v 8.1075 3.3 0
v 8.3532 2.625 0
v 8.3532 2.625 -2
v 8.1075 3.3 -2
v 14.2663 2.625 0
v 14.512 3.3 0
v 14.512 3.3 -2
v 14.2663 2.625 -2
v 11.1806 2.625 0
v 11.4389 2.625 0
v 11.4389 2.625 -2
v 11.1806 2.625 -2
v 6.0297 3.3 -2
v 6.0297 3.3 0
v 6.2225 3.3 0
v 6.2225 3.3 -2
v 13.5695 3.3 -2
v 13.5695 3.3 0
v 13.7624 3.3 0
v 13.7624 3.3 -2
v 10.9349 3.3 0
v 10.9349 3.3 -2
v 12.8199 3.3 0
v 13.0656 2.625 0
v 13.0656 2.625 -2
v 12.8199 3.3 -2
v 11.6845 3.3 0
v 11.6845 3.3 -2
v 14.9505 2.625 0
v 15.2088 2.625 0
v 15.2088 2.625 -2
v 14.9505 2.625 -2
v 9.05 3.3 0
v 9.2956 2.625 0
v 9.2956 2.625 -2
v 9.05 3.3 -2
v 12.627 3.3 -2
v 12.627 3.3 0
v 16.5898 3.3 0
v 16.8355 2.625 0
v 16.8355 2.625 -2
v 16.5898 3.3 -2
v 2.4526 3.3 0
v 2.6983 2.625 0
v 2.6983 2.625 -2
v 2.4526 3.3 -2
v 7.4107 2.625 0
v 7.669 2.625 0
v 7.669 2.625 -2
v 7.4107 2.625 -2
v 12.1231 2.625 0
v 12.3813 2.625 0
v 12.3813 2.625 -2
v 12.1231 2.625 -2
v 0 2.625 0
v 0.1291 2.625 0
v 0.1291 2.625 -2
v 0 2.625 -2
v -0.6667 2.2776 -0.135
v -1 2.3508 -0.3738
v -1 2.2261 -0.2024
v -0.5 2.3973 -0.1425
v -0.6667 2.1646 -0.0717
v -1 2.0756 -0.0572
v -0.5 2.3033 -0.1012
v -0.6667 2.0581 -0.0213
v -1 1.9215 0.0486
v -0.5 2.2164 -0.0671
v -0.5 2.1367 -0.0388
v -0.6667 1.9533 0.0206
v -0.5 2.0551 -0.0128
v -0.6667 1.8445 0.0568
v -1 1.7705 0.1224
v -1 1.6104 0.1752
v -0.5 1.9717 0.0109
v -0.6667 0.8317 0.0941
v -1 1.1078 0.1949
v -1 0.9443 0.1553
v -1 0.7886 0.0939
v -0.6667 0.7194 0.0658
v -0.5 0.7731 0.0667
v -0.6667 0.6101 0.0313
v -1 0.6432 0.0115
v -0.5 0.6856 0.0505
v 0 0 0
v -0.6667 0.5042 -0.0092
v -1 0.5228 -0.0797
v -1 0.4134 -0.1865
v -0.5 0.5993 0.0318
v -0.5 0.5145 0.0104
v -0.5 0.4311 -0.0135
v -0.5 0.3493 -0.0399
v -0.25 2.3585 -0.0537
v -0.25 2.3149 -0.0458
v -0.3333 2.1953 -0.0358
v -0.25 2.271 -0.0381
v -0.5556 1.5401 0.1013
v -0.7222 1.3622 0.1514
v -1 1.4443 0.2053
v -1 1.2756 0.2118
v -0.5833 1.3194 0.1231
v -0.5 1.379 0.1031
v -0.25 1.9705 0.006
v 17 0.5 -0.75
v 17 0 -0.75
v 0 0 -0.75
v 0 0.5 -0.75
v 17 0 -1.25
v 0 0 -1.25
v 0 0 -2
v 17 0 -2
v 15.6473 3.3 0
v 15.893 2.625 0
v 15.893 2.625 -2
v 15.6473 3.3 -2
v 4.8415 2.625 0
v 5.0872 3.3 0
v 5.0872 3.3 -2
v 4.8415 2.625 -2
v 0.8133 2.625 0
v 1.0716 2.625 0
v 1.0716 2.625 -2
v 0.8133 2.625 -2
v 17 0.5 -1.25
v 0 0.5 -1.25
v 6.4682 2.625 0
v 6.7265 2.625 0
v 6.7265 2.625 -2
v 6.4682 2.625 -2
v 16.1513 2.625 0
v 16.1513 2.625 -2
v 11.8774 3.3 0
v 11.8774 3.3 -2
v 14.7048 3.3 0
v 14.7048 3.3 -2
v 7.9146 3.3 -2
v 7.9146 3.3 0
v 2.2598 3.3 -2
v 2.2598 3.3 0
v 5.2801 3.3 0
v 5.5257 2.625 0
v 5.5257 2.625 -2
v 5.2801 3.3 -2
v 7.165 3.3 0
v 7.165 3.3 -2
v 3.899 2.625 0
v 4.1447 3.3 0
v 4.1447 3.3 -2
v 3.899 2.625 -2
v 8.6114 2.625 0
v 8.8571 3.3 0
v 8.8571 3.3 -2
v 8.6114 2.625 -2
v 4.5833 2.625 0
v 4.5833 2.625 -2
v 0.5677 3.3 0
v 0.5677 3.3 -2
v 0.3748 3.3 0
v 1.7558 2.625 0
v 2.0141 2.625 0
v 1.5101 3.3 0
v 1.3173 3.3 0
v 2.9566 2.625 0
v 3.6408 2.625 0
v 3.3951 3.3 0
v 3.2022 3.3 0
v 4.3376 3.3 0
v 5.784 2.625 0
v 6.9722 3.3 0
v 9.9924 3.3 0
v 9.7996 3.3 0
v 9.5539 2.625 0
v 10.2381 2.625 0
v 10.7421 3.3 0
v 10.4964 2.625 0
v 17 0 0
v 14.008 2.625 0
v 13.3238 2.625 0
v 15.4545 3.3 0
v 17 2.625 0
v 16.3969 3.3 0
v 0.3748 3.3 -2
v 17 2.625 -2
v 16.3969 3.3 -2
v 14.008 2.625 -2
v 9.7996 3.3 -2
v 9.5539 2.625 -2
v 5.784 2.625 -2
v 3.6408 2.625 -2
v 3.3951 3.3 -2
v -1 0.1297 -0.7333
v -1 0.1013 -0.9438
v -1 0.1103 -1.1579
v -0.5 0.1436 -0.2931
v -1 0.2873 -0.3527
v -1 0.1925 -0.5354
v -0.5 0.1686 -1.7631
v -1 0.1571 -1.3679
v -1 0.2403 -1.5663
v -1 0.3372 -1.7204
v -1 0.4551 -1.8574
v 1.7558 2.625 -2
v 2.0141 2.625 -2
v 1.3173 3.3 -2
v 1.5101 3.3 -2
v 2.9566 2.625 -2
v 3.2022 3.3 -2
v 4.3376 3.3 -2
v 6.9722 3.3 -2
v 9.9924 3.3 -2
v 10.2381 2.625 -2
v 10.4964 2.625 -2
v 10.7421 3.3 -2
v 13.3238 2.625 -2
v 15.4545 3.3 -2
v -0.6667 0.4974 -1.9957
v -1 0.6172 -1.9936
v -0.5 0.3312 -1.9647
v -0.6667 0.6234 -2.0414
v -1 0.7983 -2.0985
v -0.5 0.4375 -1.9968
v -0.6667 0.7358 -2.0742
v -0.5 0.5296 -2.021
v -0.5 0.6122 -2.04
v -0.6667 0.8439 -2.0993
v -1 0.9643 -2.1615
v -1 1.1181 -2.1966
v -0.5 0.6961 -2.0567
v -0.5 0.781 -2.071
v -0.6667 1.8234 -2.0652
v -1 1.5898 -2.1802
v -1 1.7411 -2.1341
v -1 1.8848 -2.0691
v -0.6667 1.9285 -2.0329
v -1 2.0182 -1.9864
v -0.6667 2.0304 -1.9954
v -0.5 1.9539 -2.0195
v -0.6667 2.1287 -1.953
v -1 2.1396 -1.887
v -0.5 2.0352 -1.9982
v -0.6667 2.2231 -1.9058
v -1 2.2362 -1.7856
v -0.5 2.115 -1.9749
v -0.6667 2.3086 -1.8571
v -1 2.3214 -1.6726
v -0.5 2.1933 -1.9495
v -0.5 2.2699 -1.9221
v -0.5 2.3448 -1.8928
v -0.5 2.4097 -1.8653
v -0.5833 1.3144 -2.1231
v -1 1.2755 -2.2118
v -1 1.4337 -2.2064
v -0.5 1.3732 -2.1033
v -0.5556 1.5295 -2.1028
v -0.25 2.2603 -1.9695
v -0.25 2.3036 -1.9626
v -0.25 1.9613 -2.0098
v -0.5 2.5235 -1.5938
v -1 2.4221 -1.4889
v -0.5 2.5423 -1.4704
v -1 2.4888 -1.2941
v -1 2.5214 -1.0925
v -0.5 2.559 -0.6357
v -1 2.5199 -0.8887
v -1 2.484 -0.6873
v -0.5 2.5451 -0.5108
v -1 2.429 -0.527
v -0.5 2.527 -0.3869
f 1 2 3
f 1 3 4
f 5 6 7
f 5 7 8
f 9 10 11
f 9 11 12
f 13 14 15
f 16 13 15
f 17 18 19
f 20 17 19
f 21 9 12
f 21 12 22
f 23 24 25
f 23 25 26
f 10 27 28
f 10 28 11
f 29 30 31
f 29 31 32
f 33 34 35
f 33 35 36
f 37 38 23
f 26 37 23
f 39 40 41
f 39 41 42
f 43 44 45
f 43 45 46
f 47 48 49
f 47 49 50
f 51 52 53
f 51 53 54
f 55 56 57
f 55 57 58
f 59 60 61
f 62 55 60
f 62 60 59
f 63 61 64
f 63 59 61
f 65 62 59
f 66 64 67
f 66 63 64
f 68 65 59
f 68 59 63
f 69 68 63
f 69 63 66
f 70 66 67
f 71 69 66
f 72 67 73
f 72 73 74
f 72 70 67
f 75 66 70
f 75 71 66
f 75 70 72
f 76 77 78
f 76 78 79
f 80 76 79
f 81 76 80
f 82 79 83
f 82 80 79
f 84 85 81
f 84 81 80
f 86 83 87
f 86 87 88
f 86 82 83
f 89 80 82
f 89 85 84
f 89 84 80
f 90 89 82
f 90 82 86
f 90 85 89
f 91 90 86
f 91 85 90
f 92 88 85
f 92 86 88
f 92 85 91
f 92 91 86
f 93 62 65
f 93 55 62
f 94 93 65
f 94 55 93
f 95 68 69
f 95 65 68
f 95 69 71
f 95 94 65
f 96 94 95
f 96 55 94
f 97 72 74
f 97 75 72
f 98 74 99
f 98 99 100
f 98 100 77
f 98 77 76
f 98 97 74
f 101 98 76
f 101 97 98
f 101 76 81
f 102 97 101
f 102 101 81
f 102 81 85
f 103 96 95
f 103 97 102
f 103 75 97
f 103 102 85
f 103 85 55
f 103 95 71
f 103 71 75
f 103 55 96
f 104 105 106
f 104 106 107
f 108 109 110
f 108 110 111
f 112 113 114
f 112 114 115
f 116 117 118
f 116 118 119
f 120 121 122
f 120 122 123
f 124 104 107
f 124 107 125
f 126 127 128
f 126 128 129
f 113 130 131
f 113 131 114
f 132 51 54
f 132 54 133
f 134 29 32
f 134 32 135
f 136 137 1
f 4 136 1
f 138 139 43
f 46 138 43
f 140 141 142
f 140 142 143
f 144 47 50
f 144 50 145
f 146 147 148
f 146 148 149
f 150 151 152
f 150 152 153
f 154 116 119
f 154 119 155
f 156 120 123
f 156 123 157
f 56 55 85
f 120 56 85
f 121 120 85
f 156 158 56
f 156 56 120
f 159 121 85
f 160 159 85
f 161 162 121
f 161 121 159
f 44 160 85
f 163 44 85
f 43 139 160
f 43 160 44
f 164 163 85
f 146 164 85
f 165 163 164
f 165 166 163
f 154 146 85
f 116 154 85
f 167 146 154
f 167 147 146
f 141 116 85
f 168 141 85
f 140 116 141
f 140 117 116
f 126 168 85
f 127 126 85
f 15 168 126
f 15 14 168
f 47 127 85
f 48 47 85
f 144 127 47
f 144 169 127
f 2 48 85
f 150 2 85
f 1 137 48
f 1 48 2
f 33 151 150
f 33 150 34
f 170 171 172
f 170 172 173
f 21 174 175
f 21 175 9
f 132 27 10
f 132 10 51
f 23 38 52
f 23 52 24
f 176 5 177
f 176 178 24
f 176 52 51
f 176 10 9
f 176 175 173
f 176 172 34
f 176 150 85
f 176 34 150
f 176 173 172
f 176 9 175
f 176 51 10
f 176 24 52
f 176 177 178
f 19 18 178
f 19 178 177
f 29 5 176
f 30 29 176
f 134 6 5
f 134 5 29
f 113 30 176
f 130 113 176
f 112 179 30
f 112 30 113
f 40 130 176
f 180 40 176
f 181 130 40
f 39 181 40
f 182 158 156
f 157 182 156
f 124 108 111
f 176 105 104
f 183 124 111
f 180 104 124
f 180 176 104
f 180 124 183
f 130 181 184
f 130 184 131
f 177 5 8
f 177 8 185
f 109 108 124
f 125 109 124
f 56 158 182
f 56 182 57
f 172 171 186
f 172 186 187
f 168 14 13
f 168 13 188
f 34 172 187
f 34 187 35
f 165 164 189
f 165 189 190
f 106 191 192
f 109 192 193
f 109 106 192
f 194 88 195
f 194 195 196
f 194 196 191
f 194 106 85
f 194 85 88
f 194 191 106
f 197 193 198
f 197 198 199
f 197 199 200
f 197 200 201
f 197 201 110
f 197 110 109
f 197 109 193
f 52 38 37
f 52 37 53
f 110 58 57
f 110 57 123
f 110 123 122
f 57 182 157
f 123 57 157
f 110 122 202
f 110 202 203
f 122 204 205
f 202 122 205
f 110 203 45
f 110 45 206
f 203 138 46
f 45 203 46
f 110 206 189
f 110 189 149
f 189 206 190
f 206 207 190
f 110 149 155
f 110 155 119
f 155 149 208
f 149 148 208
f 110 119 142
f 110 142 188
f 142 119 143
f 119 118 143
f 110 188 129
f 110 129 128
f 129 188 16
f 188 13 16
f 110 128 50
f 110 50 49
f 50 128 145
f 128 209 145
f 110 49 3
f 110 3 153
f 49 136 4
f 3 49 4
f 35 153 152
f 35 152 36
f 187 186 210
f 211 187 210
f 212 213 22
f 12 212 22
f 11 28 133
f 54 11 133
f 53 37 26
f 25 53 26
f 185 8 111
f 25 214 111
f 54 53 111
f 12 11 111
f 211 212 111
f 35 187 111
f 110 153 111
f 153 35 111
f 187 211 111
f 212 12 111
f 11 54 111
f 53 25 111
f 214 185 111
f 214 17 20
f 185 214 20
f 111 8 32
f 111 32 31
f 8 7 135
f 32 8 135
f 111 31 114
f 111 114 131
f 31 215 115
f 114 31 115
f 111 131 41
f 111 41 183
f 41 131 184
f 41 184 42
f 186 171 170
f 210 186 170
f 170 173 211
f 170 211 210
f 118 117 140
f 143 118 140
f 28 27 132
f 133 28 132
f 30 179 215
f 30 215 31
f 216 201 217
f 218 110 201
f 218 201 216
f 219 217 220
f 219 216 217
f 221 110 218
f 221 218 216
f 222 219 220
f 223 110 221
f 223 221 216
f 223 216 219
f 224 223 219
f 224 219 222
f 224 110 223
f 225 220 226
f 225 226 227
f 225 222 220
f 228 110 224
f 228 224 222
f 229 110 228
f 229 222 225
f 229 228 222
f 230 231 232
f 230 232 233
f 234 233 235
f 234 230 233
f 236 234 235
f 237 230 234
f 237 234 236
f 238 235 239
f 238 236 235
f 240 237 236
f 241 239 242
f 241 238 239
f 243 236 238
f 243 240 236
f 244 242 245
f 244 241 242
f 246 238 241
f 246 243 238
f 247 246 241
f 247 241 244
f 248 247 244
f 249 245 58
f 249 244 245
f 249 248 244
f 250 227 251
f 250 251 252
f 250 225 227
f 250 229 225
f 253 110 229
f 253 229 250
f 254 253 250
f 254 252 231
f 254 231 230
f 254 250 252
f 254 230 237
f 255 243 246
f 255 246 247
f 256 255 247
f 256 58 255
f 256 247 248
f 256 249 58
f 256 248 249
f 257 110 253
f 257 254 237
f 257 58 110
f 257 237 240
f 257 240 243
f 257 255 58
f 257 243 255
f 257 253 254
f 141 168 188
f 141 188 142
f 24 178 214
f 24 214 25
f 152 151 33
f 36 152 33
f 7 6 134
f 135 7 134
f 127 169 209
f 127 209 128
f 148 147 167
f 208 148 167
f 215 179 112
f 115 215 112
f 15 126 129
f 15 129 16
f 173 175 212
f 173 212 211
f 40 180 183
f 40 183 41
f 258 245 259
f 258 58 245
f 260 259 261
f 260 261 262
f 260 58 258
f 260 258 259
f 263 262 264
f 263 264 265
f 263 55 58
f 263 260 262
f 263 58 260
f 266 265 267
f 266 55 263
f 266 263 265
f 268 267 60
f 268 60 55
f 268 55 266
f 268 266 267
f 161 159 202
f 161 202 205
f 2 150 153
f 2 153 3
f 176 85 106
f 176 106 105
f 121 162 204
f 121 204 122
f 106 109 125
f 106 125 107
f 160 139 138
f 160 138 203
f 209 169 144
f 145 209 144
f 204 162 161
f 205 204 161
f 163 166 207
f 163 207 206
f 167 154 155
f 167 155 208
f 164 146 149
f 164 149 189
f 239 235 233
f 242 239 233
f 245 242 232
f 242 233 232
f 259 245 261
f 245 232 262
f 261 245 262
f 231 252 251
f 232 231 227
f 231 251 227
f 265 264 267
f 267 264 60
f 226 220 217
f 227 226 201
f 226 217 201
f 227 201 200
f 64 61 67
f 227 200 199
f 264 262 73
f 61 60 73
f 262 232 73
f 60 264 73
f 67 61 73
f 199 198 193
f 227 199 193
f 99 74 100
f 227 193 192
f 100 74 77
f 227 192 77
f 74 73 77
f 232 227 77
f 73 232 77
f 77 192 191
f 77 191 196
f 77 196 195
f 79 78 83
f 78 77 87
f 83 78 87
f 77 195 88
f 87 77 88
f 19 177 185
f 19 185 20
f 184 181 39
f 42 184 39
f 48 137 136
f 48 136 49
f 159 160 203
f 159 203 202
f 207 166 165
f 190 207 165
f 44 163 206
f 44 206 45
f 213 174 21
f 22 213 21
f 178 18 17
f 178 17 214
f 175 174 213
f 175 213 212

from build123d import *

# Parameters (mm, degrees)
BLANKSKE_W         = 17
BLANKSKE_H         = 3.3
BLANK_DEPTH        = 2
TOOTHCUTSIM_DEPTH  = 18.432441022
TEETHCUTS_COUNT    = 19
TEETHCUTS_PITCH    = 0.942477795
SKETCH1_W          = 0.5
SKETCH1_H          = 0.5
CUT_EXTRUDE1_DEPTH = 18.432441022


with BuildPart() as part:
    # BlankSke → Blank (new body)
    with BuildSketch(Plane.XY):
        with Locations((8.5, 1.65)):
            Rectangle(BLANKSKE_W, BLANKSKE_H)
    extrude(amount=-BLANK_DEPTH)

    # TooCutSkeSim → ToothCutSim (cut, through all)
    with BuildSketch(Plane.XY):
        Polygon((0.129130611, 2.625), (-0.129130611, 2.625), (-0.384055363, 3.3254), (0.384055363, 3.3254), align=None)
    toothcutsim = extrude(amount=-TOOTHCUTSIM_DEPTH, mode=Mode.SUBTRACT)

    # TeethCuts: ToothCutSim ×19
    with Locations(*[(i * TEETHCUTS_PITCH, 0, 0) for i in range(1, TEETHCUTS_COUNT)]):
        add(toothcutsim, mode=Mode.SUBTRACT)

    # Sketch1 → Cut-Extrude1 (cut, through all)
    with BuildSketch(Plane(origin=(17, 0, 0), x_dir=(0, 0, -1), z_dir=(1, 0, 0))):
        with Locations((1, 0.25)):
            Rectangle(SKETCH1_W, SKETCH1_H)
    extrude(amount=-CUT_EXTRUDE1_DEPTH, mode=Mode.SUBTRACT)

    # Loft1: read off the stored shape, not the designer's step
    # Loft1: loft between two sections, ruled curve by curve
    loft1_from = [
        Edge.make_bspline([(-1, 2.321360982, -1.672573988), (-1, 2.386469579, -1.574911092), (-1, 2.485564206, -1.365149558), (-1, 2.540372571, -1.027786651), (-1, 2.500881486, -0.688289756), (-1, 2.411377214, -0.474260245), (-1, 2.350753212, -0.373752031)], [0, 0, 0, 0, 0.25, 0.5, 0.75, 1, 1, 1, 1], 3),
        Edge.make_bspline([(-1, 2.350753212, -0.373752031), (-1, 2.25171936, -0.20956433), (-1, 1.98438986, 0.062051662), (-1, 1.433501665, 0.252036945), (-1, 0.856426864, 0.171062344), (-1, 0.542030673, -0.044333441), (-1, 0.413387868, -0.186517595)], [0, 0, 0, 0, 0.25, 0.5, 0.75, 1, 1, 1, 1], 3),
        Edge.make_bspline([(-1, 0.455133028, -1.857366972), (-1, 0.583554487, -1.985788432), (-1, 0.889022109, -2.17852057), (-1, 1.435989481, -2.247122683), (-1, 1.958881136, -2.07258365), (-1, 2.220618901, -1.82368711), (-1, 2.321360982, -1.672573988)], [0, 0, 0, 0, 0.25, 0.5, 0.75, 1, 1, 1, 1], 3),
        Edge.make_bspline([(-1, 0.413387868, -0.186517595), (-1, 0.375553122, -0.228334946), (-1, 0.306844772, -0.315959172), (-1, 0.223712602, -0.45807693), (-1, 0.160449665, -0.610084219), (-1, 0.131966282, -0.717729651), (-1, 0.103213139, -0.868683652), (-1, 0.089654768, -1.065841054), (-1, 0.141987611, -1.360301974), (-1, 0.264270675, -1.633156172), (-1, 0.386349144, -1.788583089), (-1, 0.455133028, -1.857366972)], [0, 0, 0, 0, 0.0917447, 0.183489399, 0.275234099, 0.366978799, 0.366978799, 0.525234099, 0.683489399, 0.8417447, 1, 1, 1, 1], 3),
    ]
    loft1_to = [
        Edge.make_bspline([(0, 2.625, -2), (0, 2.625, -1.833333333), (0, 2.625, -1.5), (0, 2.625, -1), (0, 2.625, -0.5), (0, 2.625, -0.166666667), (0, 2.625, 0)], [0, 0, 0, 0, 0.25, 0.5, 0.75, 1, 1, 1, 1], 3),
        Edge.make_bspline([(0, 2.625, 0), (0, 2.40625, 0), (0, 1.96875, 0), (0, 1.3125, 0), (0, 0.65625, 0), (0, 0.21875, 0), (0, 0, 0)], [0, 0, 0, 0, 0.25, 0.5, 0.75, 1, 1, 1, 1], 3),
        Edge.make_bspline([(0, 0, -2), (0, 0.21875, -2), (0, 0.65625, -2), (0, 1.3125, -2), (0, 1.96875, -2), (0, 2.40625, -2), (0, 2.625, -2)], [0, 0, 0, 0, 0.25, 0.5, 0.75, 1, 1, 1, 1], 3),
        Edge.make_bspline([(0, 0, 0), (0, 0, -0.061163133), (0, 0, -0.185429777), (0, 0, -0.375), (0, 0, -0.564570223), (0, 0, -0.688836867), (0, 0, -0.855503534), (0, 0, -1.064467717), (0, 0, -1.375), (0, 0, -1.685532283), (0, 0, -1.894496466), (0, 0, -2)], [0, 0, 0, 0, 0.0917447, 0.183489399, 0.275234099, 0.366978799, 0.366978799, 0.525234099, 0.683489399, 0.8417447, 1, 1, 1, 1], 3),
    ]
    loft1 = Solid(Shell([*[Face.make_surface_from_curves(loft1_from[k], loft1_to[k]) for k in range(4)], Face(Wire(loft1_from)), Face(Wire(loft1_to))]))
    add(loft1)


solid = part.part
